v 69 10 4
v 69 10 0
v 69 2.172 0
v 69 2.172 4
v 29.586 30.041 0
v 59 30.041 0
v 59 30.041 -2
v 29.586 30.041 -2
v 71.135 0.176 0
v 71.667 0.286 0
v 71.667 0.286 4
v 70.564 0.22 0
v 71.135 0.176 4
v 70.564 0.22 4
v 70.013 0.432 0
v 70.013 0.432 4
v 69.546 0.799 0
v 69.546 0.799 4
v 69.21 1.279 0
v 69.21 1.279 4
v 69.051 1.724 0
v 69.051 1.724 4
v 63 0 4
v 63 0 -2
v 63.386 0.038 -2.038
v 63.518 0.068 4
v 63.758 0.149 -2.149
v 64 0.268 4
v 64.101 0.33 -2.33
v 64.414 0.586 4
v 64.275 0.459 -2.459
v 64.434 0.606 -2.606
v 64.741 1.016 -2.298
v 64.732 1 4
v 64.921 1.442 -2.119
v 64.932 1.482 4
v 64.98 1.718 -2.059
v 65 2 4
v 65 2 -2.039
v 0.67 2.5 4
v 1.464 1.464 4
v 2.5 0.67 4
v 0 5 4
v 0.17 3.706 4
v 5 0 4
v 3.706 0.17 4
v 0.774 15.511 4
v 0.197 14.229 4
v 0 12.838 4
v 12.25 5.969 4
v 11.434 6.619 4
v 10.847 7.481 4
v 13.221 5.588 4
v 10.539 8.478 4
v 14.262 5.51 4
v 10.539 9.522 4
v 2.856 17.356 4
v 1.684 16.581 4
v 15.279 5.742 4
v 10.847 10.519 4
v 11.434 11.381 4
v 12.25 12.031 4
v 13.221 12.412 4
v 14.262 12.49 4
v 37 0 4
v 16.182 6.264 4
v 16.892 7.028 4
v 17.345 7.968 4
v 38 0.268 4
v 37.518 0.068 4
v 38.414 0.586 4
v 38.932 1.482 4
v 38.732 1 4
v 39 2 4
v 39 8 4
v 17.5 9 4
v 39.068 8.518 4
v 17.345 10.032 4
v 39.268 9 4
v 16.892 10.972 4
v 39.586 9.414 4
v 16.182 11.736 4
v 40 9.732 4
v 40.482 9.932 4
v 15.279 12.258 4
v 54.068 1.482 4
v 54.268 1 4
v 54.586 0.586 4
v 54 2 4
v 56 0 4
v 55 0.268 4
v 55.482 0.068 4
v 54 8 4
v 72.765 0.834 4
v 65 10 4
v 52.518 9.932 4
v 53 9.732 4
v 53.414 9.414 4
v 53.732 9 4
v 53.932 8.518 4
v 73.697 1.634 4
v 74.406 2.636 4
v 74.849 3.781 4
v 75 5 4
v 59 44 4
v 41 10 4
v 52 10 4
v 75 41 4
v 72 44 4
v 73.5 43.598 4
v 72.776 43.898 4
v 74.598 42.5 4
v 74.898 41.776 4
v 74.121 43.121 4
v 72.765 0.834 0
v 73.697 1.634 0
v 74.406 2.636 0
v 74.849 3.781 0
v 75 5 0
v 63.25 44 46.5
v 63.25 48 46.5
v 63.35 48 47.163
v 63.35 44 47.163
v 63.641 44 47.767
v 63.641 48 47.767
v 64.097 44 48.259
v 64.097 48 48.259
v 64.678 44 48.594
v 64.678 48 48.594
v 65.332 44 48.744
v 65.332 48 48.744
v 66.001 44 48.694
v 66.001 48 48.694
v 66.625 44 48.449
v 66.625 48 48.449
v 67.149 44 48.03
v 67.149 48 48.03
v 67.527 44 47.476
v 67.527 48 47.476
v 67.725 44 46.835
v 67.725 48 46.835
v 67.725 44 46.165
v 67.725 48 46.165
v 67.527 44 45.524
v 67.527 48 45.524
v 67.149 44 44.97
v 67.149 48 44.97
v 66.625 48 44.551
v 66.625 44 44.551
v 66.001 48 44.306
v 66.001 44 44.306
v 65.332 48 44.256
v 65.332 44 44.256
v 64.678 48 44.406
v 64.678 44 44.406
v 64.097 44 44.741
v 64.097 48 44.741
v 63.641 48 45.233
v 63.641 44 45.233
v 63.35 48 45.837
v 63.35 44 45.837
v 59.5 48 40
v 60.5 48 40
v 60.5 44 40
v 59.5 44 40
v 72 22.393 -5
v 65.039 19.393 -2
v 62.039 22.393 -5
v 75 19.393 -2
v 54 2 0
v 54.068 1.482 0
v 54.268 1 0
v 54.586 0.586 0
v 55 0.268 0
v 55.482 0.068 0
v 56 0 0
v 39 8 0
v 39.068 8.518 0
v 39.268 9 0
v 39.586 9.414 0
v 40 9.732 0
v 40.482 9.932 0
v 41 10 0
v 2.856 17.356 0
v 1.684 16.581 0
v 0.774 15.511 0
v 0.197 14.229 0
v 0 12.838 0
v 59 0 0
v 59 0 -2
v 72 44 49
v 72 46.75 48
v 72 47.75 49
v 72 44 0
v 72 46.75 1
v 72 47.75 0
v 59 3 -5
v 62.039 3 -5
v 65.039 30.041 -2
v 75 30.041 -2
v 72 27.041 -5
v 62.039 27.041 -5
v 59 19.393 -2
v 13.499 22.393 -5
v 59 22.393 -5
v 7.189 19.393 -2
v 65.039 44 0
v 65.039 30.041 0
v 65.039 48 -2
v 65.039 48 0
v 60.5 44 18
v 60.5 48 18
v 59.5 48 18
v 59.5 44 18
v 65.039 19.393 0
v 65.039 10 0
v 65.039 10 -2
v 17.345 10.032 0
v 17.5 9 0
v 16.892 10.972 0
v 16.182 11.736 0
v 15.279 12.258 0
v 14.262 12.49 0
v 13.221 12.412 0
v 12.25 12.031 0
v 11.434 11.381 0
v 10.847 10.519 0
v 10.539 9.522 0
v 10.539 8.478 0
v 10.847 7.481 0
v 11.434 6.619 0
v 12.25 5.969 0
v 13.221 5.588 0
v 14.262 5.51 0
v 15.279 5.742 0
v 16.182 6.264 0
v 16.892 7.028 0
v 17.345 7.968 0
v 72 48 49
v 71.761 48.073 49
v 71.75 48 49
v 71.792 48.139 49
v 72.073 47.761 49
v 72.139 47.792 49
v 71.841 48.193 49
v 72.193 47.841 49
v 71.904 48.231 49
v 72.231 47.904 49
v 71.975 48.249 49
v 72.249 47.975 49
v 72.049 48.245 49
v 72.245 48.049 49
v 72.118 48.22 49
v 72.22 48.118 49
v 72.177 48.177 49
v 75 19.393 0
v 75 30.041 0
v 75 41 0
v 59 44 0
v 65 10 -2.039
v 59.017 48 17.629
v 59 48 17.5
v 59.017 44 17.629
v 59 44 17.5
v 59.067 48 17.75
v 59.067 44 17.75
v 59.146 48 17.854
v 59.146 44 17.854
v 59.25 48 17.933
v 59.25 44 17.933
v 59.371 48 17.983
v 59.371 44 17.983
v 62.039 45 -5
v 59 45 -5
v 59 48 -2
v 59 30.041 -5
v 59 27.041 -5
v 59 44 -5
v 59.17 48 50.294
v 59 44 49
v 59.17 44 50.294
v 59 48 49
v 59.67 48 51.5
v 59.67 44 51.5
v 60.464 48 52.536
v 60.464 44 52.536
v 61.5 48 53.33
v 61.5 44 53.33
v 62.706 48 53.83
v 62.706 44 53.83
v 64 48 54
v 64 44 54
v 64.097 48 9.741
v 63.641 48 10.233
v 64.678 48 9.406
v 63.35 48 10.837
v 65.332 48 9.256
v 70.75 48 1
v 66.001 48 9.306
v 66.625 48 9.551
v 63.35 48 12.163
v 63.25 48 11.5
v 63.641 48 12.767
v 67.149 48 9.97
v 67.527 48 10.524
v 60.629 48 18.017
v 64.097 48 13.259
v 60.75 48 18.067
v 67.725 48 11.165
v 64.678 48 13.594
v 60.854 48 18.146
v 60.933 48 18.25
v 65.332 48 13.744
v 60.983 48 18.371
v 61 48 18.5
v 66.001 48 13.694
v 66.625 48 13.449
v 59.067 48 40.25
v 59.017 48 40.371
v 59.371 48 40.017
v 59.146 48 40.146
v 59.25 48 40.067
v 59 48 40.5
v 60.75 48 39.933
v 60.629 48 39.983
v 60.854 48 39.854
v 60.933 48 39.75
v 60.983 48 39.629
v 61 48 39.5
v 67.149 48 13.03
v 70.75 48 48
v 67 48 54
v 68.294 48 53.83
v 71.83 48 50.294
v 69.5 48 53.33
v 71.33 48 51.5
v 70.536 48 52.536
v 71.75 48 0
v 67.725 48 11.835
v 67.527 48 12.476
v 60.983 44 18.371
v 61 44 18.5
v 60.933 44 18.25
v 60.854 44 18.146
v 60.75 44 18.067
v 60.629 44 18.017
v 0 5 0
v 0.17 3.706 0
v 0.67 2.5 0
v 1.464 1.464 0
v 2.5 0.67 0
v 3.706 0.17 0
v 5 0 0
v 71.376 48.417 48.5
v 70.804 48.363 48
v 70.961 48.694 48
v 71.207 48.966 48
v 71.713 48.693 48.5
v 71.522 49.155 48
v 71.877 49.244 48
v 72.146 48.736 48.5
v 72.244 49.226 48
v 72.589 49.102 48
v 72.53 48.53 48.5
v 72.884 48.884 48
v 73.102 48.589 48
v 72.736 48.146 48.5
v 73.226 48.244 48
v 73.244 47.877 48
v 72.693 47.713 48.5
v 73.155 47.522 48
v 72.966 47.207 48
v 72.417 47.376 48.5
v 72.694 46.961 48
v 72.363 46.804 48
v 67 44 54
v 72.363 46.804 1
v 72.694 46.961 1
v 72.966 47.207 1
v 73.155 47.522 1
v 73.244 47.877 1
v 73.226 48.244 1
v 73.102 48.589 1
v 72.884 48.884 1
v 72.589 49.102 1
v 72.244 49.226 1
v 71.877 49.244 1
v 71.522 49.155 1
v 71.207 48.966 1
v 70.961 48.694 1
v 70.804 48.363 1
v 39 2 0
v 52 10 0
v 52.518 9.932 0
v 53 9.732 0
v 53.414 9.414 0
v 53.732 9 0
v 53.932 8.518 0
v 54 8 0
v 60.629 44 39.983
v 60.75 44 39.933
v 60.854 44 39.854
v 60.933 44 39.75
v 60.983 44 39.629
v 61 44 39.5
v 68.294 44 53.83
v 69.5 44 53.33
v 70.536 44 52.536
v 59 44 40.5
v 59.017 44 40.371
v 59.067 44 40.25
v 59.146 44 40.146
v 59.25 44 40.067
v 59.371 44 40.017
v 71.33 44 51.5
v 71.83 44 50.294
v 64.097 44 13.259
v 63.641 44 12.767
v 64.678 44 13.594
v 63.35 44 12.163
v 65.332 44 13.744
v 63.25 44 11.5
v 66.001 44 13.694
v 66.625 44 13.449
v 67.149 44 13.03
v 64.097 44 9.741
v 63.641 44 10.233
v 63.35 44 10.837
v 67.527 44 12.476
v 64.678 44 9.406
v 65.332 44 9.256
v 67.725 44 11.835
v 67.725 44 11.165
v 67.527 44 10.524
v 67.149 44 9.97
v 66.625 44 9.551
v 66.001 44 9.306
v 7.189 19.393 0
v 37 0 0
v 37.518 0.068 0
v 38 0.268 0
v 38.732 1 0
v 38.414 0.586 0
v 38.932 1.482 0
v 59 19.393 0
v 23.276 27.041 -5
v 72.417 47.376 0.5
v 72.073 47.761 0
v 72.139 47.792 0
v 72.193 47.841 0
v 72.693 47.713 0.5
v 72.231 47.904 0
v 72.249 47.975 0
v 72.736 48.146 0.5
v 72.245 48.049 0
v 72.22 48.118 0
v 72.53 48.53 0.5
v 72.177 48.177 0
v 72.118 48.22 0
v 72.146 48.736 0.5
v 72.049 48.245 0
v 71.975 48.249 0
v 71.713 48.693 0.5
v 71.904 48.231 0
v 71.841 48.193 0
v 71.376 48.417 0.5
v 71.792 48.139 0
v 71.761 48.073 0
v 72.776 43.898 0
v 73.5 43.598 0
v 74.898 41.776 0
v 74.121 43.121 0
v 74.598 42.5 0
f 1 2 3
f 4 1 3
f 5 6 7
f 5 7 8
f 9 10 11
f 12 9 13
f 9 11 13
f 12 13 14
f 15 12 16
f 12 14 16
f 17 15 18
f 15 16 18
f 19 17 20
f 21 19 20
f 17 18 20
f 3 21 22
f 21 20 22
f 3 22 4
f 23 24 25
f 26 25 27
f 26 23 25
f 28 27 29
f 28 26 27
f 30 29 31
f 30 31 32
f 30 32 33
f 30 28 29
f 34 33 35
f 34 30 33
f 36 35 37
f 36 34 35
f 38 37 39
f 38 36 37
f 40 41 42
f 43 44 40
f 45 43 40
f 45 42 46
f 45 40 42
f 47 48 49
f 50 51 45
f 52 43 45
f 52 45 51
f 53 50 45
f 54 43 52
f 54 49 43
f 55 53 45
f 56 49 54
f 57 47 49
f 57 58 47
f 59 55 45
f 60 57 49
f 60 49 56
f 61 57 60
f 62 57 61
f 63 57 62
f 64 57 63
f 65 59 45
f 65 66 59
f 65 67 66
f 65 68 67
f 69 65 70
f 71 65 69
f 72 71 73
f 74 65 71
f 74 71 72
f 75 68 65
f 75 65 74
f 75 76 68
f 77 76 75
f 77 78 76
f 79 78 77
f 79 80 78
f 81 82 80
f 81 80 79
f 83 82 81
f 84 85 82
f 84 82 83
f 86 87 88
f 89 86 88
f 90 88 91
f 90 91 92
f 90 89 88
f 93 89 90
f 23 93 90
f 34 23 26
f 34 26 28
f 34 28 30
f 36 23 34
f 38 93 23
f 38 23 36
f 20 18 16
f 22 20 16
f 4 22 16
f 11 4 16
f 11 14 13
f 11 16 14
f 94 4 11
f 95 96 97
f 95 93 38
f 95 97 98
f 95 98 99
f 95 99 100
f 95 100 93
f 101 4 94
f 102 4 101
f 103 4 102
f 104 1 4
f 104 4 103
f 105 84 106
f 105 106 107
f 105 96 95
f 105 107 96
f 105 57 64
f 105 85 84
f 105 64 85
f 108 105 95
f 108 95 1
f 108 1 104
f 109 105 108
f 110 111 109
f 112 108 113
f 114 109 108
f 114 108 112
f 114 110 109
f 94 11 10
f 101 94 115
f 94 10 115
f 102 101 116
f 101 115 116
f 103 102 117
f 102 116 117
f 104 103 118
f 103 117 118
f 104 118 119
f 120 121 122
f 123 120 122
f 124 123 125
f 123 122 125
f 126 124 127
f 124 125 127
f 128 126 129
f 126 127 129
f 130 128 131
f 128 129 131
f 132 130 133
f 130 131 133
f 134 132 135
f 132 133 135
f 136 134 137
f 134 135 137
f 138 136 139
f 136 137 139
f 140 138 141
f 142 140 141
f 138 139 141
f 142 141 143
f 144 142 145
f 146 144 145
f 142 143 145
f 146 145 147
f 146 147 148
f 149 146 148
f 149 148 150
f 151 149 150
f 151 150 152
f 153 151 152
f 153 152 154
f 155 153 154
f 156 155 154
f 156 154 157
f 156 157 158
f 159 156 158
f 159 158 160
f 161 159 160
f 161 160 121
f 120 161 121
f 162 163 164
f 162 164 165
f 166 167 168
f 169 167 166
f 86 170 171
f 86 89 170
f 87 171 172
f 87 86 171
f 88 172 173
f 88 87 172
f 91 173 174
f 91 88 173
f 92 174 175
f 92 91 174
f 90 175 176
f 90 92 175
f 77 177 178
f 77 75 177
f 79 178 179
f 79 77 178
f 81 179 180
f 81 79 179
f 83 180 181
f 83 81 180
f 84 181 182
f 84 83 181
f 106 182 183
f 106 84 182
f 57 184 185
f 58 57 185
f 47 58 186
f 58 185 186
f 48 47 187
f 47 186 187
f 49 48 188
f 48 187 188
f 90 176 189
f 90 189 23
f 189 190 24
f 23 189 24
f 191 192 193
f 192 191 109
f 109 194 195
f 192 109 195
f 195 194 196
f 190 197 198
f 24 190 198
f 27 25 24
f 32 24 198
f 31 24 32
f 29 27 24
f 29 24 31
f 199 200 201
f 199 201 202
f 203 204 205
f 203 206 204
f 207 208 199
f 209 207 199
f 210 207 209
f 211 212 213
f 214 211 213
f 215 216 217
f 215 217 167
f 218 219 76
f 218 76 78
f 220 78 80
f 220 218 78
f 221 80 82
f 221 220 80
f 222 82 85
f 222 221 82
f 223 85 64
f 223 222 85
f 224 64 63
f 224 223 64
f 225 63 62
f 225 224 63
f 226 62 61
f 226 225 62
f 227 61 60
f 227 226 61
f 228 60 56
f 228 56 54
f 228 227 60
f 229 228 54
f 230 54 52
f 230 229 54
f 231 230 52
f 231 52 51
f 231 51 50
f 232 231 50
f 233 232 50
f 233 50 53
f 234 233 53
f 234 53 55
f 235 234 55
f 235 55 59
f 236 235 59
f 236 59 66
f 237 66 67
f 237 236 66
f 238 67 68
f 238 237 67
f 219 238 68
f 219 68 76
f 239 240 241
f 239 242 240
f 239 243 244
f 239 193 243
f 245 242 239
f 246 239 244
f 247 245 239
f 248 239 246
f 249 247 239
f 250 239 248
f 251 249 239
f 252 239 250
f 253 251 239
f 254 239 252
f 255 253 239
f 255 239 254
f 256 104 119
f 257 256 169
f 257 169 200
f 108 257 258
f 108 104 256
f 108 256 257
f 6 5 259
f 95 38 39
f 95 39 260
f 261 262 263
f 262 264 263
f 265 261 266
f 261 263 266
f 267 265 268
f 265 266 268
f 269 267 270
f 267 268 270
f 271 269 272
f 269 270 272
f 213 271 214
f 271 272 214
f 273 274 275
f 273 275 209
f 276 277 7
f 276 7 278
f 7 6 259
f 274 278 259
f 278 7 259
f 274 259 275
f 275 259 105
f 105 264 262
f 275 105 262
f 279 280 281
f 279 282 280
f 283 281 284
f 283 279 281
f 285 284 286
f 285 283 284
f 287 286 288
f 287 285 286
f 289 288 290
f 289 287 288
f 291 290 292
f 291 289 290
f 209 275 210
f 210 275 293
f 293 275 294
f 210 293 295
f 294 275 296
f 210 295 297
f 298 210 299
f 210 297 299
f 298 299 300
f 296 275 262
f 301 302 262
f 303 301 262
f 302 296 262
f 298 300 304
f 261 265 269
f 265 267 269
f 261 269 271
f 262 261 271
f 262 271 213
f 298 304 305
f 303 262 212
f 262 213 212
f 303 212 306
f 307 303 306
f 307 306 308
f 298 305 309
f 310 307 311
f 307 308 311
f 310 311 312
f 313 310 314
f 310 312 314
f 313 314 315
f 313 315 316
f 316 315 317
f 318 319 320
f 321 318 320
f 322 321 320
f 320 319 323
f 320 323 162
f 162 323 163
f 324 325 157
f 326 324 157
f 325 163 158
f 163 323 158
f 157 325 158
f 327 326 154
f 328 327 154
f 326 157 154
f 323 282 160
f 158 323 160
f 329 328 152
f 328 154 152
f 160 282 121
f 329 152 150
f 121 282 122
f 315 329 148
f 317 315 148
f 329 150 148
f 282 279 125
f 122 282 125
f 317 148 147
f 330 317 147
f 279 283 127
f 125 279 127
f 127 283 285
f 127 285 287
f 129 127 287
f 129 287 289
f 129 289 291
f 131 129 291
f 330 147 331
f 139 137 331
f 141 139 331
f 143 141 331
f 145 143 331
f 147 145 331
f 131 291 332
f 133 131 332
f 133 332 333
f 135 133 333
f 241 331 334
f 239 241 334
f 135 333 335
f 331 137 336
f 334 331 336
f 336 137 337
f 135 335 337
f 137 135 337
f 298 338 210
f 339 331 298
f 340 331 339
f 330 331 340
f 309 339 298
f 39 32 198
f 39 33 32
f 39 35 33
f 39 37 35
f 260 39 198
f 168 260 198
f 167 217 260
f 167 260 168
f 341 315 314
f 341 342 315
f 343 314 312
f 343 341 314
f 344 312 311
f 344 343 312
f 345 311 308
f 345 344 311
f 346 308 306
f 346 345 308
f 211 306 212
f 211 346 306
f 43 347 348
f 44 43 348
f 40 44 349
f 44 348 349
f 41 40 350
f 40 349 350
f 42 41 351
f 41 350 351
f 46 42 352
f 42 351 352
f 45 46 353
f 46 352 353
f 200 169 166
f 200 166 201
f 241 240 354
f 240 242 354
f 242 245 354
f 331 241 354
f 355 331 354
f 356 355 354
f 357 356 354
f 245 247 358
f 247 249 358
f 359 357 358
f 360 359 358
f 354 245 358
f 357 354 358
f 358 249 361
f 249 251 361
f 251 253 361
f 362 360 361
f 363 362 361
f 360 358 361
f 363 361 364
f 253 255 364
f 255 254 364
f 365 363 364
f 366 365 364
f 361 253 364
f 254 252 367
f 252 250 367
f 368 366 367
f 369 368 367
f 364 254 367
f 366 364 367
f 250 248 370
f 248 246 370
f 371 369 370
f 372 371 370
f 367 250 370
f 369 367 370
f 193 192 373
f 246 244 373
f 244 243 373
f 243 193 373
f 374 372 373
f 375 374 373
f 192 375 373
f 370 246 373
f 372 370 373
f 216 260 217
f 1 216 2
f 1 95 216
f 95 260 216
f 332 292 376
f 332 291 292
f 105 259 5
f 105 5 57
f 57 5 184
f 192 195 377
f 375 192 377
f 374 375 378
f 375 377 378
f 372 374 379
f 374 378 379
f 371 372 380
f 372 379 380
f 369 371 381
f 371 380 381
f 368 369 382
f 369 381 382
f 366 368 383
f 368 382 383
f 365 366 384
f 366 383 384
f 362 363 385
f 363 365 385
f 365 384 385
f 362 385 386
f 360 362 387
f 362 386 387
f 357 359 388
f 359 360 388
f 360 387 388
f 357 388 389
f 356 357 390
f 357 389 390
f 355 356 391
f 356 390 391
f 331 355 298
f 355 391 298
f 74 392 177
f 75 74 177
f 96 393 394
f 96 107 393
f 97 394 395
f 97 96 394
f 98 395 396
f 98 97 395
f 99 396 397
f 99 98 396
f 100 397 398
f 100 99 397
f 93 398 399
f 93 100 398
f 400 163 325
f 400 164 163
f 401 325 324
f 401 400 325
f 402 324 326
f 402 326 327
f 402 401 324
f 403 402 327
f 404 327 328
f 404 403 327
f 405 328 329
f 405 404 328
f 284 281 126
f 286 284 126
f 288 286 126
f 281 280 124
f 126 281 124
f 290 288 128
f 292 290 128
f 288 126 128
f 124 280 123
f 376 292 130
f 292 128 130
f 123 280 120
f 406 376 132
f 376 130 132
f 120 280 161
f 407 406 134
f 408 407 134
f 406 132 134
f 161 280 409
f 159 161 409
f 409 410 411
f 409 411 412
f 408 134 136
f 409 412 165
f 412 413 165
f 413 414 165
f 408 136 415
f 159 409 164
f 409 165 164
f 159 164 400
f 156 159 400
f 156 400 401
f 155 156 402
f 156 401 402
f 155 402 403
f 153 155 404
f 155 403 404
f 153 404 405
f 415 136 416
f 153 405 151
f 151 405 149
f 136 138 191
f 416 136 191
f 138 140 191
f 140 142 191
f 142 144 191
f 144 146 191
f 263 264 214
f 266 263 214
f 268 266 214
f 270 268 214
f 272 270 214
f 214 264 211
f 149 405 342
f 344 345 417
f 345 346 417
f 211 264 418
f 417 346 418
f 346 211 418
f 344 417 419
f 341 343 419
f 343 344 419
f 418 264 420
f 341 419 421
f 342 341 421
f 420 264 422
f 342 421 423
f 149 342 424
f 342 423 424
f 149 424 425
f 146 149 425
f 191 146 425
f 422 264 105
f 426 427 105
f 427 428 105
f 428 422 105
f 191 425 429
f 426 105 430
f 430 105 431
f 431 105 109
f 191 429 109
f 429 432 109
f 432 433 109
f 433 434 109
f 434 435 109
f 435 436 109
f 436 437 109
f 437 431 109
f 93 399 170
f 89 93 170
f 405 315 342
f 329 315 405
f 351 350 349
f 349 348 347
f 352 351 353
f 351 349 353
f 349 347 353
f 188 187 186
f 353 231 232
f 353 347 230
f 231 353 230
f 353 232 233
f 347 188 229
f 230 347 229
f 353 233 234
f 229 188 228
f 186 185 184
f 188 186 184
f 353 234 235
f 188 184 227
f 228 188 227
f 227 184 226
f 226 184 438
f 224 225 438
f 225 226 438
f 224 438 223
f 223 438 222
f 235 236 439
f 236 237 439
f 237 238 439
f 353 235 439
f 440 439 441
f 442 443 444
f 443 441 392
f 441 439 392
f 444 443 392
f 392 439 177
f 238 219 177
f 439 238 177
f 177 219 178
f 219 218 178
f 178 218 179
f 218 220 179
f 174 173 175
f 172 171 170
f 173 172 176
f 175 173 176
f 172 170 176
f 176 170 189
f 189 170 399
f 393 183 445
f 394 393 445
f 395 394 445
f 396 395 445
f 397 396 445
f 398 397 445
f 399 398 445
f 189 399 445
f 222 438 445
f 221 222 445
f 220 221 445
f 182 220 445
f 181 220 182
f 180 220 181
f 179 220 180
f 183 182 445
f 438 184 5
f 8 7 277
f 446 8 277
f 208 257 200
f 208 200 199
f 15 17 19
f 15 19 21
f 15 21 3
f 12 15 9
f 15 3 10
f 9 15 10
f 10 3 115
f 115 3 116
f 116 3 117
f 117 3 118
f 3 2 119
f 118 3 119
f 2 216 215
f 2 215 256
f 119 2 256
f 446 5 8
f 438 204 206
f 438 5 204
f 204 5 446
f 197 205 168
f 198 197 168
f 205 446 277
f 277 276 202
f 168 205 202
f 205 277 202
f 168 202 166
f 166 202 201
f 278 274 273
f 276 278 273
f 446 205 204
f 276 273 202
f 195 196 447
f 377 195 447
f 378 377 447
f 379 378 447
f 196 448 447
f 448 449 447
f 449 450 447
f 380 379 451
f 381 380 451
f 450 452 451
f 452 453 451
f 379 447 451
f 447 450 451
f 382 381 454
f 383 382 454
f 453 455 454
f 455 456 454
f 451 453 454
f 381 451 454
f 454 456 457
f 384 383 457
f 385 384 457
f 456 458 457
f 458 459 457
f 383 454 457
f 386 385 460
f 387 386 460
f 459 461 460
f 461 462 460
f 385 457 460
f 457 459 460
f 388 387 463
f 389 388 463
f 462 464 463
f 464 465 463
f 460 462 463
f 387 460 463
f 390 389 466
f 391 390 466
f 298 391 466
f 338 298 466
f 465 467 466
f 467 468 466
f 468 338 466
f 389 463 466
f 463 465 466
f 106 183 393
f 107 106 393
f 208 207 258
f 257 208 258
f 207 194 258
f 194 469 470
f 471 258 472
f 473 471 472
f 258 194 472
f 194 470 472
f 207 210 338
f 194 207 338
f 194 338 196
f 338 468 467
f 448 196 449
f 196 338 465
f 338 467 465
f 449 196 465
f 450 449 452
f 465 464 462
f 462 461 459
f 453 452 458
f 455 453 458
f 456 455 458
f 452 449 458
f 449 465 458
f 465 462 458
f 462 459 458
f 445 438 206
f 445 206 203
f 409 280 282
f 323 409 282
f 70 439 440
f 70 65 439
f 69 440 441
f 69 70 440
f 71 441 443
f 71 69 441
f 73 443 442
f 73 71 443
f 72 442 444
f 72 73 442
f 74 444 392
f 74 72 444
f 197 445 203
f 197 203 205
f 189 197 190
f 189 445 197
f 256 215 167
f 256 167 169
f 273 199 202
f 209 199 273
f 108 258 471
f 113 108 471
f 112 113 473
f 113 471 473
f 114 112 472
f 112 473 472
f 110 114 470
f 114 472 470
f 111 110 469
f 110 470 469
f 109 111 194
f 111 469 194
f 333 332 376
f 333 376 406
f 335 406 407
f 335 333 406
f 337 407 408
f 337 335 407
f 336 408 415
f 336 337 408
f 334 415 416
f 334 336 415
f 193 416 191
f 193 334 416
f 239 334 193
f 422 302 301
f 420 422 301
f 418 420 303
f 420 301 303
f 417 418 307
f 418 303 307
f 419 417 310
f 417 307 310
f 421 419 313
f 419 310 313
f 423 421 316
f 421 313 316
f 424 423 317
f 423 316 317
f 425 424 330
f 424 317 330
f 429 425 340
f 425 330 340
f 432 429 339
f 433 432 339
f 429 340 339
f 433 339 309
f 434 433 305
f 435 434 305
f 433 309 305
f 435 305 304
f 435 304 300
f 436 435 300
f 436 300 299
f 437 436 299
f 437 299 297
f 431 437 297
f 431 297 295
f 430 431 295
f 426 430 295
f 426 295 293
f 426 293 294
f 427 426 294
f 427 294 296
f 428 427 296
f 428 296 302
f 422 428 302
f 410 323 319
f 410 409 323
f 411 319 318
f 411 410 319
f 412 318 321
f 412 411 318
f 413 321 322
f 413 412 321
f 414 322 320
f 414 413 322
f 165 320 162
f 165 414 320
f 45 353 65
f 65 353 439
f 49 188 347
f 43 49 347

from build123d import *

# Parameters (mm, degrees)
F0_R      = 3.5
F1_DEPTH  = 4
F0_W      = 13
F0_H      = 4
F2_DEPTH  = 54
F3_R      = 5
F4_W      = 6.0393586755
F4_H      = 4
F5_DEPTH  = 5
F6_SIZE   = 3
F4_R      = 1.25
F7_DEPTH  = 49
F8_SIZE   = 1
F9_SIZE   = 1
F10_R     = 2.25
F11_DEPTH = 5
F12_R     = 2
F13_W     = 2
F13_H     = 22
F14_DEPTH = 5
F15_R     = 0.5


with BuildPart() as f1:
    # F0 (on Top) → F1 (new body)
    with BuildSketch(Plane.XY):
        with BuildLine():
            ThreePointArc((0, 5), (1.4644660941, 1.4644660941), (5, 0))
            Line((5, 0), (39, 0))
            Line((39, 0), (39, 10))
            Line((39, 10), (54, 10))
            Line((54, 10), (54, 0))
            Line((54, 0), (65, 0))
            Line((65, 0), (65, 10))
            Line((65, 10), (69, 10))
            Line((69, 10), (69, 0))
            Line((69, 0), (70, 0))
            ThreePointArc((70, 0), (73.5355339059, 1.4644660941), (75, 5))
            Line((75, 5), (75, 41))
            ThreePointArc((75, 41), (74.1213203436, 43.1213203436), (72, 44))
            Line((72, 44), (59, 44))
            Line((59, 44), (2.8562777384, 17.3555216386))
            ThreePointArc((2.8562777384, 17.3555216386), (0.7739728285, 15.5106003536), (0, 12.8383925874))
            Line((0, 12.8383925874), (0, 5))
        make_face()
        with Locations((14, 9)):
            Circle(F0_R, mode=Mode.SUBTRACT)
    extrude(amount=F1_DEPTH)

    # F0 (on Top) → F2 (join)
    with BuildSketch(Plane.XY):
        with Locations((65.5, 46)):
            Rectangle(F0_W, F0_H)
    extrude(amount=F2_DEPTH)

    # F3
    f3_edges = [f1.edges().sort_by_distance(p)[0] for p in [
        (72, 46, 54),
        (59, 46, 54),
    ]]
    fillet(f3_edges, radius=F3_R)

    # F4 (on face) → F5 (join)
    with BuildSketch(Plane.XY):
        Polygon((29.5861130485, 30.0408672094), (7.1886969879, 19.3925328106), (59, 19.3925328106), (59, 0), (65, 0), (65, 10), (65.0393586755, 10), (65.0393586755, 19.3925328106), (75, 19.3925328106), (75, 30.0408672094), (65.0393586755, 30.0408672094), (65.0393586755, 44), (59, 44), (59, 30.0408672094), align=None)
        with Locations((62.0196793377, 46)):
            Rectangle(F4_W, F4_H)
    extrude(amount=-F5_DEPTH)

    # F6 (call 1 of 4: OpenCascade refuses the feature's edges together)
    f6_edges = [f1.edges().sort_by_distance(p)[0] for p in [
        (62.019679, 48, -5),
        (75, 24.7167, -5),
        (70.019679, 30.040867, -5),
        (70.019679, 19.392533, -5),
        (65.039359, 39.020434, -5),
        (65.039359, 14.696266, -5),
    ]]
    chamfer(f6_edges, length=F6_SIZE)

    # F6#2 (call 2 of 4)
    f6_2_edges = [f1.edges().sort_by_distance(p)[0] for p in [
        (62, 0, -5),
    ]]
    chamfer(f6_2_edges, length=F6_SIZE)

    # F6#3 (call 3 of 4)
    f6_3_edges = [f1.edges().sort_by_distance(p)[0] for p in [
        (44.293057, 30.040867, -5),
    ]]
    chamfer(f6_3_edges, length=F6_SIZE)

    # F6#4 (call 4 of 4)
    f6_4_edges = [f1.edges().sort_by_distance(p)[0] for p in [
        (33.094348, 19.392533, -5),
    ]]
    chamfer(f6_4_edges, length=F6_SIZE)

    # F4 (on face) → F7 (join)
    with BuildSketch(Plane.XY):
        with Locations((72, 48)):
            Circle(F4_R)
    extrude(amount=F7_DEPTH)

    # F8
    f8_edges = [f1.edges().sort_by_distance(p)[0] for p in [
        (72.883883, 48.883883, 49),
    ]]
    chamfer(f8_edges, length=F8_SIZE)

    # F9
    f9_edges = [f1.edges().sort_by_distance(p)[0] for p in [
        (72.883883, 48.883883, 0),
    ]]
    chamfer(f9_edges, length=F9_SIZE)

    # F10 (on face) → F11 (cut)
    with BuildSketch(Plane(origin=(0, 48, 0), x_dir=(-1, 0, 0), z_dir=(0, 1, 0))):
        with Locations((-65.5, 11.5)):
            Circle(F10_R)
        with Locations((-65.5, 46.5)):
            Circle(F10_R)
    extrude(amount=-F11_DEPTH, mode=Mode.SUBTRACT)

    # F12
    f12_edges = [f1.edges().sort_by_distance(p)[0] for p in [
        (54, 10, 2),
        (54, 0, 2),
        (39, 10, 2),
        (39, 0, 2),
        (65, 0, 1),
        (69, 0, 2),
    ]]
    fillet(f12_edges, radius=F12_R)

    # F13 (on face) → F14 (cut)
    with BuildSketch(Plane(origin=(0, 48, 0), x_dir=(-1, 0, 0), z_dir=(0, 1, 0))):
        with Locations((-60, 29)):
            Rectangle(F13_W, F13_H)
    extrude(amount=-F14_DEPTH, mode=Mode.SUBTRACT)

    # F15
    f15_edges = [f1.edges().sort_by_distance(p)[0] for p in [
        (59, 46, 40),
        (59, 46, 18),
        (61, 46, 18),
        (61, 46, 40),
    ]]
    fillet(f15_edges, radius=F15_R)


solid = f1.part
